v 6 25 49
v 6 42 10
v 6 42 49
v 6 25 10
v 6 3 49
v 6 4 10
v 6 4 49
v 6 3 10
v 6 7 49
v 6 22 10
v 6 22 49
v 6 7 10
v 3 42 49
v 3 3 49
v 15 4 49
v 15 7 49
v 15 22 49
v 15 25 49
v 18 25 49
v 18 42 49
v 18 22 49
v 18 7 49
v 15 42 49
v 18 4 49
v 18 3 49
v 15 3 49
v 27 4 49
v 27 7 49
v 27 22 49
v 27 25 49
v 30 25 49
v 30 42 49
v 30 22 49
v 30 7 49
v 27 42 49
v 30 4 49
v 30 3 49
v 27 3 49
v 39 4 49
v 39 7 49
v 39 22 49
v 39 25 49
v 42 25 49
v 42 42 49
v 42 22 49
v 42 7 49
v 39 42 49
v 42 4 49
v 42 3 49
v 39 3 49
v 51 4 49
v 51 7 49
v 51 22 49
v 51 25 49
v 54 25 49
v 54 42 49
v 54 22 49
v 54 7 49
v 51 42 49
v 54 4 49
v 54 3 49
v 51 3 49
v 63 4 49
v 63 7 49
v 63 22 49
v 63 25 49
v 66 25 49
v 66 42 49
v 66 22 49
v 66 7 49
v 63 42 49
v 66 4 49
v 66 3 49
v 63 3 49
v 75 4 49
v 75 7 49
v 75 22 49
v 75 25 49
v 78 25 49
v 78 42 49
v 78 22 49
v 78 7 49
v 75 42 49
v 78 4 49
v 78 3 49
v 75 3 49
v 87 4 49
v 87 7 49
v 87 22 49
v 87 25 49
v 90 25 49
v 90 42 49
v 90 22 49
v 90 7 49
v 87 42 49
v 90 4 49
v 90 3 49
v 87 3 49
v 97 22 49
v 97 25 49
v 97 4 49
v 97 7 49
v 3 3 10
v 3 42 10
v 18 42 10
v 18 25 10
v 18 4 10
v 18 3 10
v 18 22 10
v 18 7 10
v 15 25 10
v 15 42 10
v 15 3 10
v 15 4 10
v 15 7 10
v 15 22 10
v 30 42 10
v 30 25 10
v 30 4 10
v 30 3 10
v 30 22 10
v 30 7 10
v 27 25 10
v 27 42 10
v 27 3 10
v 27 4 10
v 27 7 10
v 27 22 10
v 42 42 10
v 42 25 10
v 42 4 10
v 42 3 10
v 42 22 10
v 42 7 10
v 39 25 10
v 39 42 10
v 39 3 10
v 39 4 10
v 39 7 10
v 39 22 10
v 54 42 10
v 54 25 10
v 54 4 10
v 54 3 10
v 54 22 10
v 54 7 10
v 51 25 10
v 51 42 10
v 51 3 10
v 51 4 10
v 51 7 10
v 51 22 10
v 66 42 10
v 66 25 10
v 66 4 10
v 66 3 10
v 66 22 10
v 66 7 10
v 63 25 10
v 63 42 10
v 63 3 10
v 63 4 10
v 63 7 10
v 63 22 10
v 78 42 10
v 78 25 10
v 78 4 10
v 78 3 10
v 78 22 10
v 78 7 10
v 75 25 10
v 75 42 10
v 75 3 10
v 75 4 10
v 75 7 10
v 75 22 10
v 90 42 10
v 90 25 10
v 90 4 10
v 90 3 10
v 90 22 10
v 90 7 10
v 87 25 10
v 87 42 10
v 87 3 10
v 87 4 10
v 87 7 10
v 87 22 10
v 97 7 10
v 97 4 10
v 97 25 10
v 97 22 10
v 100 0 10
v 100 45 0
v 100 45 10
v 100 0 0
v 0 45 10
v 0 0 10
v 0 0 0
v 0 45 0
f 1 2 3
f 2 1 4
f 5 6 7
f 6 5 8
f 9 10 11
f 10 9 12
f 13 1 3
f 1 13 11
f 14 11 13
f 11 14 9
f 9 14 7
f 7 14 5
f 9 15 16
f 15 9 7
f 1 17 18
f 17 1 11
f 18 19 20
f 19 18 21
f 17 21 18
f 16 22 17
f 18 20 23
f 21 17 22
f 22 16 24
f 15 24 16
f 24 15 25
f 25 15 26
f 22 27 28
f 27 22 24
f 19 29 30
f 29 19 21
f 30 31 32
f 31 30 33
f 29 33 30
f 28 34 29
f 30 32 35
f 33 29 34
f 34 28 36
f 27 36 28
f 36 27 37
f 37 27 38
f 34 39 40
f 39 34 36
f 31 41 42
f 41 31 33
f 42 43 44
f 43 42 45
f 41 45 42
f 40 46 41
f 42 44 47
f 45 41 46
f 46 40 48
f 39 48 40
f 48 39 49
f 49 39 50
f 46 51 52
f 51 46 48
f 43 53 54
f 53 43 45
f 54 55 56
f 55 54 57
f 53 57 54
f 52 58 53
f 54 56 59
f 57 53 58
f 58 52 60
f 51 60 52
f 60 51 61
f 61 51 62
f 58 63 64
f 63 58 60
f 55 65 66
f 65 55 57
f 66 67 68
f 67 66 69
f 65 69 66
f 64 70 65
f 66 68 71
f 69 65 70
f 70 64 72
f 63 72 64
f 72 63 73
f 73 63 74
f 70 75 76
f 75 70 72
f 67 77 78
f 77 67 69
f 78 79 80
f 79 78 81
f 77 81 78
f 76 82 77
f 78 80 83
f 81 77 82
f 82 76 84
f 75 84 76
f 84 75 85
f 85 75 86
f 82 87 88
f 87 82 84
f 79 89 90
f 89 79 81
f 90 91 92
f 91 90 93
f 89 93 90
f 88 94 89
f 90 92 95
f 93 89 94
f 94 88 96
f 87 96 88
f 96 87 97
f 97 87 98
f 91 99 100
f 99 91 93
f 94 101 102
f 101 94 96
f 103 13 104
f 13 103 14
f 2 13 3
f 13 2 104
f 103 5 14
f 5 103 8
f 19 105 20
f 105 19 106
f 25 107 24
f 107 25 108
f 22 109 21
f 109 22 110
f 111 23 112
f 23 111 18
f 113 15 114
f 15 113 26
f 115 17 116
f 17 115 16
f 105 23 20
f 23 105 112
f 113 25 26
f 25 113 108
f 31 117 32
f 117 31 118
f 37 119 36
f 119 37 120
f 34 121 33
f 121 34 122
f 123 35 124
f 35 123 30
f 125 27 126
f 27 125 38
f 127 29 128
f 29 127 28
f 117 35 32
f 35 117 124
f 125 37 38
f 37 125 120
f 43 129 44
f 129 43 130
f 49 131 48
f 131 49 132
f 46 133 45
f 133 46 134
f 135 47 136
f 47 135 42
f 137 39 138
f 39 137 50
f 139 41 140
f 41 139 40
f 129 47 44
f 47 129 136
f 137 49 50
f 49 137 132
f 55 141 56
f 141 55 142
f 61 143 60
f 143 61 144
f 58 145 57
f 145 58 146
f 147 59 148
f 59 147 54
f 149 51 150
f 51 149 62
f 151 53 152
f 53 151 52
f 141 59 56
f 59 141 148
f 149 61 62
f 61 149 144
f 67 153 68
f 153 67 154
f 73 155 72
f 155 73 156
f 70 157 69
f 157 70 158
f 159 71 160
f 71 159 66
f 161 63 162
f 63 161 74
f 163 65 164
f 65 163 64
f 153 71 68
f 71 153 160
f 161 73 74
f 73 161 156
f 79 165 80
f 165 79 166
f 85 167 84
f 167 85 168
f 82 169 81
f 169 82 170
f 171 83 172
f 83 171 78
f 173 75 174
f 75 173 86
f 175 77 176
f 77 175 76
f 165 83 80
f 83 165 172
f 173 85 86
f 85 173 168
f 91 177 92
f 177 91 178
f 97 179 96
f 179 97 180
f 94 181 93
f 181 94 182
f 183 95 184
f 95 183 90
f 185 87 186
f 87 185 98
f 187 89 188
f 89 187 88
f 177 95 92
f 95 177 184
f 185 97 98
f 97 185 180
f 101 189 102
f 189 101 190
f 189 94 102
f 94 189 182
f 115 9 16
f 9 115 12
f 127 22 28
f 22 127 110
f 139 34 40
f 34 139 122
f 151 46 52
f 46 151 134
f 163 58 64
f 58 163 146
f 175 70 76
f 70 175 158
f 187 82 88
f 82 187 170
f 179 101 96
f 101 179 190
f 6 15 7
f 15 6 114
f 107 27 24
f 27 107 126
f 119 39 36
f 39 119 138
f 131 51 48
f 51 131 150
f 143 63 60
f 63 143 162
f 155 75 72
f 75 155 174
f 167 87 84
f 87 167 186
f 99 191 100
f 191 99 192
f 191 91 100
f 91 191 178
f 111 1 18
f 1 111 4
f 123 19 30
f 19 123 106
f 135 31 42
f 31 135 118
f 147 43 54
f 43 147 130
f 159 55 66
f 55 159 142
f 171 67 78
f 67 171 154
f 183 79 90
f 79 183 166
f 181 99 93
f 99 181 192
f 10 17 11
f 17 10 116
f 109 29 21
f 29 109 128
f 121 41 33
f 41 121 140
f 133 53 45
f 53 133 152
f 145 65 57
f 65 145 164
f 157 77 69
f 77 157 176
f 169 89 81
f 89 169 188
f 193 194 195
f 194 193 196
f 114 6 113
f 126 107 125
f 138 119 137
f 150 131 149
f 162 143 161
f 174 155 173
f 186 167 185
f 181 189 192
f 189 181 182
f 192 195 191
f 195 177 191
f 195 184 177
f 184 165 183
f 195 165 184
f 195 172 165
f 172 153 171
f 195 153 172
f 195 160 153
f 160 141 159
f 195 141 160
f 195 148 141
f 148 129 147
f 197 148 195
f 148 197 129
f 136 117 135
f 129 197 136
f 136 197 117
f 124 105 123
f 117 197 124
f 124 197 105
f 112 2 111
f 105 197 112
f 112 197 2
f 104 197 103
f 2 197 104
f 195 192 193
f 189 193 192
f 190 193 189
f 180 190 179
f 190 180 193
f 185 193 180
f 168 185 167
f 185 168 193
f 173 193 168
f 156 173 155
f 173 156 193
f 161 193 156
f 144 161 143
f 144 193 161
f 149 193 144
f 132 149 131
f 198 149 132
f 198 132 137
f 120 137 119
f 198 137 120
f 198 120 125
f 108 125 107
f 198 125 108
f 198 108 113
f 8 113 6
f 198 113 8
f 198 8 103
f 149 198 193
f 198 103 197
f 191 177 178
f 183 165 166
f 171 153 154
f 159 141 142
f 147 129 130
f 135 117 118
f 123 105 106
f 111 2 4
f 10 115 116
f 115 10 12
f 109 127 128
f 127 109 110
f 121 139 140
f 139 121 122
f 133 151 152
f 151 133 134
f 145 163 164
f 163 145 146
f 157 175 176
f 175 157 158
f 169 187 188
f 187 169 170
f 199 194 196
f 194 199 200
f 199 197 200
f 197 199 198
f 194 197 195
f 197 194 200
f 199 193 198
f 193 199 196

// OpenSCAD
$fn = 32;

// ----------------------------------------------------------------------
// Heatsink: cross fin block
// ----------------------------------------------------------------------

// --- parameters (mm) ---
base_l = 100;             // base length, X
base_w = 45;              // base width, Y
base_t = 10;              // base plate thickness
fin_h = 40;               // fin height above the base
fin_t = 3;                // fin thickness
edge = 3;                 // margin from the base ends
pitch = 12;               // fin pitch
rib_pitch = 18;           // cross rib pitch
fit_tol = 0.1;            // tolerance for press fits, mm
free_tol = 0.3;           // tolerance for clearance fits, mm

n_fins = floor((base_l - 2 * edge - fin_t) / pitch) + 1;  // fin count
total_h = base_t + fin_h - 1;  // overall height
n_ribs = floor((base_w - 2 * edge) / rib_pitch);  // rib count

union() {
  cube([base_l, base_w, base_t]);
  for (i = [0 : n_fins - 1])
    translate([edge + i * pitch, edge, base_t - 1])
      cube([fin_t, base_w - 2 * edge, fin_h]);
  for (i = [0 : n_ribs - 1])
    translate([edge, edge + 1 + i * rib_pitch, base_t - 1])
      cube([base_l - 2 * edge, fin_t, fin_h]);
}
